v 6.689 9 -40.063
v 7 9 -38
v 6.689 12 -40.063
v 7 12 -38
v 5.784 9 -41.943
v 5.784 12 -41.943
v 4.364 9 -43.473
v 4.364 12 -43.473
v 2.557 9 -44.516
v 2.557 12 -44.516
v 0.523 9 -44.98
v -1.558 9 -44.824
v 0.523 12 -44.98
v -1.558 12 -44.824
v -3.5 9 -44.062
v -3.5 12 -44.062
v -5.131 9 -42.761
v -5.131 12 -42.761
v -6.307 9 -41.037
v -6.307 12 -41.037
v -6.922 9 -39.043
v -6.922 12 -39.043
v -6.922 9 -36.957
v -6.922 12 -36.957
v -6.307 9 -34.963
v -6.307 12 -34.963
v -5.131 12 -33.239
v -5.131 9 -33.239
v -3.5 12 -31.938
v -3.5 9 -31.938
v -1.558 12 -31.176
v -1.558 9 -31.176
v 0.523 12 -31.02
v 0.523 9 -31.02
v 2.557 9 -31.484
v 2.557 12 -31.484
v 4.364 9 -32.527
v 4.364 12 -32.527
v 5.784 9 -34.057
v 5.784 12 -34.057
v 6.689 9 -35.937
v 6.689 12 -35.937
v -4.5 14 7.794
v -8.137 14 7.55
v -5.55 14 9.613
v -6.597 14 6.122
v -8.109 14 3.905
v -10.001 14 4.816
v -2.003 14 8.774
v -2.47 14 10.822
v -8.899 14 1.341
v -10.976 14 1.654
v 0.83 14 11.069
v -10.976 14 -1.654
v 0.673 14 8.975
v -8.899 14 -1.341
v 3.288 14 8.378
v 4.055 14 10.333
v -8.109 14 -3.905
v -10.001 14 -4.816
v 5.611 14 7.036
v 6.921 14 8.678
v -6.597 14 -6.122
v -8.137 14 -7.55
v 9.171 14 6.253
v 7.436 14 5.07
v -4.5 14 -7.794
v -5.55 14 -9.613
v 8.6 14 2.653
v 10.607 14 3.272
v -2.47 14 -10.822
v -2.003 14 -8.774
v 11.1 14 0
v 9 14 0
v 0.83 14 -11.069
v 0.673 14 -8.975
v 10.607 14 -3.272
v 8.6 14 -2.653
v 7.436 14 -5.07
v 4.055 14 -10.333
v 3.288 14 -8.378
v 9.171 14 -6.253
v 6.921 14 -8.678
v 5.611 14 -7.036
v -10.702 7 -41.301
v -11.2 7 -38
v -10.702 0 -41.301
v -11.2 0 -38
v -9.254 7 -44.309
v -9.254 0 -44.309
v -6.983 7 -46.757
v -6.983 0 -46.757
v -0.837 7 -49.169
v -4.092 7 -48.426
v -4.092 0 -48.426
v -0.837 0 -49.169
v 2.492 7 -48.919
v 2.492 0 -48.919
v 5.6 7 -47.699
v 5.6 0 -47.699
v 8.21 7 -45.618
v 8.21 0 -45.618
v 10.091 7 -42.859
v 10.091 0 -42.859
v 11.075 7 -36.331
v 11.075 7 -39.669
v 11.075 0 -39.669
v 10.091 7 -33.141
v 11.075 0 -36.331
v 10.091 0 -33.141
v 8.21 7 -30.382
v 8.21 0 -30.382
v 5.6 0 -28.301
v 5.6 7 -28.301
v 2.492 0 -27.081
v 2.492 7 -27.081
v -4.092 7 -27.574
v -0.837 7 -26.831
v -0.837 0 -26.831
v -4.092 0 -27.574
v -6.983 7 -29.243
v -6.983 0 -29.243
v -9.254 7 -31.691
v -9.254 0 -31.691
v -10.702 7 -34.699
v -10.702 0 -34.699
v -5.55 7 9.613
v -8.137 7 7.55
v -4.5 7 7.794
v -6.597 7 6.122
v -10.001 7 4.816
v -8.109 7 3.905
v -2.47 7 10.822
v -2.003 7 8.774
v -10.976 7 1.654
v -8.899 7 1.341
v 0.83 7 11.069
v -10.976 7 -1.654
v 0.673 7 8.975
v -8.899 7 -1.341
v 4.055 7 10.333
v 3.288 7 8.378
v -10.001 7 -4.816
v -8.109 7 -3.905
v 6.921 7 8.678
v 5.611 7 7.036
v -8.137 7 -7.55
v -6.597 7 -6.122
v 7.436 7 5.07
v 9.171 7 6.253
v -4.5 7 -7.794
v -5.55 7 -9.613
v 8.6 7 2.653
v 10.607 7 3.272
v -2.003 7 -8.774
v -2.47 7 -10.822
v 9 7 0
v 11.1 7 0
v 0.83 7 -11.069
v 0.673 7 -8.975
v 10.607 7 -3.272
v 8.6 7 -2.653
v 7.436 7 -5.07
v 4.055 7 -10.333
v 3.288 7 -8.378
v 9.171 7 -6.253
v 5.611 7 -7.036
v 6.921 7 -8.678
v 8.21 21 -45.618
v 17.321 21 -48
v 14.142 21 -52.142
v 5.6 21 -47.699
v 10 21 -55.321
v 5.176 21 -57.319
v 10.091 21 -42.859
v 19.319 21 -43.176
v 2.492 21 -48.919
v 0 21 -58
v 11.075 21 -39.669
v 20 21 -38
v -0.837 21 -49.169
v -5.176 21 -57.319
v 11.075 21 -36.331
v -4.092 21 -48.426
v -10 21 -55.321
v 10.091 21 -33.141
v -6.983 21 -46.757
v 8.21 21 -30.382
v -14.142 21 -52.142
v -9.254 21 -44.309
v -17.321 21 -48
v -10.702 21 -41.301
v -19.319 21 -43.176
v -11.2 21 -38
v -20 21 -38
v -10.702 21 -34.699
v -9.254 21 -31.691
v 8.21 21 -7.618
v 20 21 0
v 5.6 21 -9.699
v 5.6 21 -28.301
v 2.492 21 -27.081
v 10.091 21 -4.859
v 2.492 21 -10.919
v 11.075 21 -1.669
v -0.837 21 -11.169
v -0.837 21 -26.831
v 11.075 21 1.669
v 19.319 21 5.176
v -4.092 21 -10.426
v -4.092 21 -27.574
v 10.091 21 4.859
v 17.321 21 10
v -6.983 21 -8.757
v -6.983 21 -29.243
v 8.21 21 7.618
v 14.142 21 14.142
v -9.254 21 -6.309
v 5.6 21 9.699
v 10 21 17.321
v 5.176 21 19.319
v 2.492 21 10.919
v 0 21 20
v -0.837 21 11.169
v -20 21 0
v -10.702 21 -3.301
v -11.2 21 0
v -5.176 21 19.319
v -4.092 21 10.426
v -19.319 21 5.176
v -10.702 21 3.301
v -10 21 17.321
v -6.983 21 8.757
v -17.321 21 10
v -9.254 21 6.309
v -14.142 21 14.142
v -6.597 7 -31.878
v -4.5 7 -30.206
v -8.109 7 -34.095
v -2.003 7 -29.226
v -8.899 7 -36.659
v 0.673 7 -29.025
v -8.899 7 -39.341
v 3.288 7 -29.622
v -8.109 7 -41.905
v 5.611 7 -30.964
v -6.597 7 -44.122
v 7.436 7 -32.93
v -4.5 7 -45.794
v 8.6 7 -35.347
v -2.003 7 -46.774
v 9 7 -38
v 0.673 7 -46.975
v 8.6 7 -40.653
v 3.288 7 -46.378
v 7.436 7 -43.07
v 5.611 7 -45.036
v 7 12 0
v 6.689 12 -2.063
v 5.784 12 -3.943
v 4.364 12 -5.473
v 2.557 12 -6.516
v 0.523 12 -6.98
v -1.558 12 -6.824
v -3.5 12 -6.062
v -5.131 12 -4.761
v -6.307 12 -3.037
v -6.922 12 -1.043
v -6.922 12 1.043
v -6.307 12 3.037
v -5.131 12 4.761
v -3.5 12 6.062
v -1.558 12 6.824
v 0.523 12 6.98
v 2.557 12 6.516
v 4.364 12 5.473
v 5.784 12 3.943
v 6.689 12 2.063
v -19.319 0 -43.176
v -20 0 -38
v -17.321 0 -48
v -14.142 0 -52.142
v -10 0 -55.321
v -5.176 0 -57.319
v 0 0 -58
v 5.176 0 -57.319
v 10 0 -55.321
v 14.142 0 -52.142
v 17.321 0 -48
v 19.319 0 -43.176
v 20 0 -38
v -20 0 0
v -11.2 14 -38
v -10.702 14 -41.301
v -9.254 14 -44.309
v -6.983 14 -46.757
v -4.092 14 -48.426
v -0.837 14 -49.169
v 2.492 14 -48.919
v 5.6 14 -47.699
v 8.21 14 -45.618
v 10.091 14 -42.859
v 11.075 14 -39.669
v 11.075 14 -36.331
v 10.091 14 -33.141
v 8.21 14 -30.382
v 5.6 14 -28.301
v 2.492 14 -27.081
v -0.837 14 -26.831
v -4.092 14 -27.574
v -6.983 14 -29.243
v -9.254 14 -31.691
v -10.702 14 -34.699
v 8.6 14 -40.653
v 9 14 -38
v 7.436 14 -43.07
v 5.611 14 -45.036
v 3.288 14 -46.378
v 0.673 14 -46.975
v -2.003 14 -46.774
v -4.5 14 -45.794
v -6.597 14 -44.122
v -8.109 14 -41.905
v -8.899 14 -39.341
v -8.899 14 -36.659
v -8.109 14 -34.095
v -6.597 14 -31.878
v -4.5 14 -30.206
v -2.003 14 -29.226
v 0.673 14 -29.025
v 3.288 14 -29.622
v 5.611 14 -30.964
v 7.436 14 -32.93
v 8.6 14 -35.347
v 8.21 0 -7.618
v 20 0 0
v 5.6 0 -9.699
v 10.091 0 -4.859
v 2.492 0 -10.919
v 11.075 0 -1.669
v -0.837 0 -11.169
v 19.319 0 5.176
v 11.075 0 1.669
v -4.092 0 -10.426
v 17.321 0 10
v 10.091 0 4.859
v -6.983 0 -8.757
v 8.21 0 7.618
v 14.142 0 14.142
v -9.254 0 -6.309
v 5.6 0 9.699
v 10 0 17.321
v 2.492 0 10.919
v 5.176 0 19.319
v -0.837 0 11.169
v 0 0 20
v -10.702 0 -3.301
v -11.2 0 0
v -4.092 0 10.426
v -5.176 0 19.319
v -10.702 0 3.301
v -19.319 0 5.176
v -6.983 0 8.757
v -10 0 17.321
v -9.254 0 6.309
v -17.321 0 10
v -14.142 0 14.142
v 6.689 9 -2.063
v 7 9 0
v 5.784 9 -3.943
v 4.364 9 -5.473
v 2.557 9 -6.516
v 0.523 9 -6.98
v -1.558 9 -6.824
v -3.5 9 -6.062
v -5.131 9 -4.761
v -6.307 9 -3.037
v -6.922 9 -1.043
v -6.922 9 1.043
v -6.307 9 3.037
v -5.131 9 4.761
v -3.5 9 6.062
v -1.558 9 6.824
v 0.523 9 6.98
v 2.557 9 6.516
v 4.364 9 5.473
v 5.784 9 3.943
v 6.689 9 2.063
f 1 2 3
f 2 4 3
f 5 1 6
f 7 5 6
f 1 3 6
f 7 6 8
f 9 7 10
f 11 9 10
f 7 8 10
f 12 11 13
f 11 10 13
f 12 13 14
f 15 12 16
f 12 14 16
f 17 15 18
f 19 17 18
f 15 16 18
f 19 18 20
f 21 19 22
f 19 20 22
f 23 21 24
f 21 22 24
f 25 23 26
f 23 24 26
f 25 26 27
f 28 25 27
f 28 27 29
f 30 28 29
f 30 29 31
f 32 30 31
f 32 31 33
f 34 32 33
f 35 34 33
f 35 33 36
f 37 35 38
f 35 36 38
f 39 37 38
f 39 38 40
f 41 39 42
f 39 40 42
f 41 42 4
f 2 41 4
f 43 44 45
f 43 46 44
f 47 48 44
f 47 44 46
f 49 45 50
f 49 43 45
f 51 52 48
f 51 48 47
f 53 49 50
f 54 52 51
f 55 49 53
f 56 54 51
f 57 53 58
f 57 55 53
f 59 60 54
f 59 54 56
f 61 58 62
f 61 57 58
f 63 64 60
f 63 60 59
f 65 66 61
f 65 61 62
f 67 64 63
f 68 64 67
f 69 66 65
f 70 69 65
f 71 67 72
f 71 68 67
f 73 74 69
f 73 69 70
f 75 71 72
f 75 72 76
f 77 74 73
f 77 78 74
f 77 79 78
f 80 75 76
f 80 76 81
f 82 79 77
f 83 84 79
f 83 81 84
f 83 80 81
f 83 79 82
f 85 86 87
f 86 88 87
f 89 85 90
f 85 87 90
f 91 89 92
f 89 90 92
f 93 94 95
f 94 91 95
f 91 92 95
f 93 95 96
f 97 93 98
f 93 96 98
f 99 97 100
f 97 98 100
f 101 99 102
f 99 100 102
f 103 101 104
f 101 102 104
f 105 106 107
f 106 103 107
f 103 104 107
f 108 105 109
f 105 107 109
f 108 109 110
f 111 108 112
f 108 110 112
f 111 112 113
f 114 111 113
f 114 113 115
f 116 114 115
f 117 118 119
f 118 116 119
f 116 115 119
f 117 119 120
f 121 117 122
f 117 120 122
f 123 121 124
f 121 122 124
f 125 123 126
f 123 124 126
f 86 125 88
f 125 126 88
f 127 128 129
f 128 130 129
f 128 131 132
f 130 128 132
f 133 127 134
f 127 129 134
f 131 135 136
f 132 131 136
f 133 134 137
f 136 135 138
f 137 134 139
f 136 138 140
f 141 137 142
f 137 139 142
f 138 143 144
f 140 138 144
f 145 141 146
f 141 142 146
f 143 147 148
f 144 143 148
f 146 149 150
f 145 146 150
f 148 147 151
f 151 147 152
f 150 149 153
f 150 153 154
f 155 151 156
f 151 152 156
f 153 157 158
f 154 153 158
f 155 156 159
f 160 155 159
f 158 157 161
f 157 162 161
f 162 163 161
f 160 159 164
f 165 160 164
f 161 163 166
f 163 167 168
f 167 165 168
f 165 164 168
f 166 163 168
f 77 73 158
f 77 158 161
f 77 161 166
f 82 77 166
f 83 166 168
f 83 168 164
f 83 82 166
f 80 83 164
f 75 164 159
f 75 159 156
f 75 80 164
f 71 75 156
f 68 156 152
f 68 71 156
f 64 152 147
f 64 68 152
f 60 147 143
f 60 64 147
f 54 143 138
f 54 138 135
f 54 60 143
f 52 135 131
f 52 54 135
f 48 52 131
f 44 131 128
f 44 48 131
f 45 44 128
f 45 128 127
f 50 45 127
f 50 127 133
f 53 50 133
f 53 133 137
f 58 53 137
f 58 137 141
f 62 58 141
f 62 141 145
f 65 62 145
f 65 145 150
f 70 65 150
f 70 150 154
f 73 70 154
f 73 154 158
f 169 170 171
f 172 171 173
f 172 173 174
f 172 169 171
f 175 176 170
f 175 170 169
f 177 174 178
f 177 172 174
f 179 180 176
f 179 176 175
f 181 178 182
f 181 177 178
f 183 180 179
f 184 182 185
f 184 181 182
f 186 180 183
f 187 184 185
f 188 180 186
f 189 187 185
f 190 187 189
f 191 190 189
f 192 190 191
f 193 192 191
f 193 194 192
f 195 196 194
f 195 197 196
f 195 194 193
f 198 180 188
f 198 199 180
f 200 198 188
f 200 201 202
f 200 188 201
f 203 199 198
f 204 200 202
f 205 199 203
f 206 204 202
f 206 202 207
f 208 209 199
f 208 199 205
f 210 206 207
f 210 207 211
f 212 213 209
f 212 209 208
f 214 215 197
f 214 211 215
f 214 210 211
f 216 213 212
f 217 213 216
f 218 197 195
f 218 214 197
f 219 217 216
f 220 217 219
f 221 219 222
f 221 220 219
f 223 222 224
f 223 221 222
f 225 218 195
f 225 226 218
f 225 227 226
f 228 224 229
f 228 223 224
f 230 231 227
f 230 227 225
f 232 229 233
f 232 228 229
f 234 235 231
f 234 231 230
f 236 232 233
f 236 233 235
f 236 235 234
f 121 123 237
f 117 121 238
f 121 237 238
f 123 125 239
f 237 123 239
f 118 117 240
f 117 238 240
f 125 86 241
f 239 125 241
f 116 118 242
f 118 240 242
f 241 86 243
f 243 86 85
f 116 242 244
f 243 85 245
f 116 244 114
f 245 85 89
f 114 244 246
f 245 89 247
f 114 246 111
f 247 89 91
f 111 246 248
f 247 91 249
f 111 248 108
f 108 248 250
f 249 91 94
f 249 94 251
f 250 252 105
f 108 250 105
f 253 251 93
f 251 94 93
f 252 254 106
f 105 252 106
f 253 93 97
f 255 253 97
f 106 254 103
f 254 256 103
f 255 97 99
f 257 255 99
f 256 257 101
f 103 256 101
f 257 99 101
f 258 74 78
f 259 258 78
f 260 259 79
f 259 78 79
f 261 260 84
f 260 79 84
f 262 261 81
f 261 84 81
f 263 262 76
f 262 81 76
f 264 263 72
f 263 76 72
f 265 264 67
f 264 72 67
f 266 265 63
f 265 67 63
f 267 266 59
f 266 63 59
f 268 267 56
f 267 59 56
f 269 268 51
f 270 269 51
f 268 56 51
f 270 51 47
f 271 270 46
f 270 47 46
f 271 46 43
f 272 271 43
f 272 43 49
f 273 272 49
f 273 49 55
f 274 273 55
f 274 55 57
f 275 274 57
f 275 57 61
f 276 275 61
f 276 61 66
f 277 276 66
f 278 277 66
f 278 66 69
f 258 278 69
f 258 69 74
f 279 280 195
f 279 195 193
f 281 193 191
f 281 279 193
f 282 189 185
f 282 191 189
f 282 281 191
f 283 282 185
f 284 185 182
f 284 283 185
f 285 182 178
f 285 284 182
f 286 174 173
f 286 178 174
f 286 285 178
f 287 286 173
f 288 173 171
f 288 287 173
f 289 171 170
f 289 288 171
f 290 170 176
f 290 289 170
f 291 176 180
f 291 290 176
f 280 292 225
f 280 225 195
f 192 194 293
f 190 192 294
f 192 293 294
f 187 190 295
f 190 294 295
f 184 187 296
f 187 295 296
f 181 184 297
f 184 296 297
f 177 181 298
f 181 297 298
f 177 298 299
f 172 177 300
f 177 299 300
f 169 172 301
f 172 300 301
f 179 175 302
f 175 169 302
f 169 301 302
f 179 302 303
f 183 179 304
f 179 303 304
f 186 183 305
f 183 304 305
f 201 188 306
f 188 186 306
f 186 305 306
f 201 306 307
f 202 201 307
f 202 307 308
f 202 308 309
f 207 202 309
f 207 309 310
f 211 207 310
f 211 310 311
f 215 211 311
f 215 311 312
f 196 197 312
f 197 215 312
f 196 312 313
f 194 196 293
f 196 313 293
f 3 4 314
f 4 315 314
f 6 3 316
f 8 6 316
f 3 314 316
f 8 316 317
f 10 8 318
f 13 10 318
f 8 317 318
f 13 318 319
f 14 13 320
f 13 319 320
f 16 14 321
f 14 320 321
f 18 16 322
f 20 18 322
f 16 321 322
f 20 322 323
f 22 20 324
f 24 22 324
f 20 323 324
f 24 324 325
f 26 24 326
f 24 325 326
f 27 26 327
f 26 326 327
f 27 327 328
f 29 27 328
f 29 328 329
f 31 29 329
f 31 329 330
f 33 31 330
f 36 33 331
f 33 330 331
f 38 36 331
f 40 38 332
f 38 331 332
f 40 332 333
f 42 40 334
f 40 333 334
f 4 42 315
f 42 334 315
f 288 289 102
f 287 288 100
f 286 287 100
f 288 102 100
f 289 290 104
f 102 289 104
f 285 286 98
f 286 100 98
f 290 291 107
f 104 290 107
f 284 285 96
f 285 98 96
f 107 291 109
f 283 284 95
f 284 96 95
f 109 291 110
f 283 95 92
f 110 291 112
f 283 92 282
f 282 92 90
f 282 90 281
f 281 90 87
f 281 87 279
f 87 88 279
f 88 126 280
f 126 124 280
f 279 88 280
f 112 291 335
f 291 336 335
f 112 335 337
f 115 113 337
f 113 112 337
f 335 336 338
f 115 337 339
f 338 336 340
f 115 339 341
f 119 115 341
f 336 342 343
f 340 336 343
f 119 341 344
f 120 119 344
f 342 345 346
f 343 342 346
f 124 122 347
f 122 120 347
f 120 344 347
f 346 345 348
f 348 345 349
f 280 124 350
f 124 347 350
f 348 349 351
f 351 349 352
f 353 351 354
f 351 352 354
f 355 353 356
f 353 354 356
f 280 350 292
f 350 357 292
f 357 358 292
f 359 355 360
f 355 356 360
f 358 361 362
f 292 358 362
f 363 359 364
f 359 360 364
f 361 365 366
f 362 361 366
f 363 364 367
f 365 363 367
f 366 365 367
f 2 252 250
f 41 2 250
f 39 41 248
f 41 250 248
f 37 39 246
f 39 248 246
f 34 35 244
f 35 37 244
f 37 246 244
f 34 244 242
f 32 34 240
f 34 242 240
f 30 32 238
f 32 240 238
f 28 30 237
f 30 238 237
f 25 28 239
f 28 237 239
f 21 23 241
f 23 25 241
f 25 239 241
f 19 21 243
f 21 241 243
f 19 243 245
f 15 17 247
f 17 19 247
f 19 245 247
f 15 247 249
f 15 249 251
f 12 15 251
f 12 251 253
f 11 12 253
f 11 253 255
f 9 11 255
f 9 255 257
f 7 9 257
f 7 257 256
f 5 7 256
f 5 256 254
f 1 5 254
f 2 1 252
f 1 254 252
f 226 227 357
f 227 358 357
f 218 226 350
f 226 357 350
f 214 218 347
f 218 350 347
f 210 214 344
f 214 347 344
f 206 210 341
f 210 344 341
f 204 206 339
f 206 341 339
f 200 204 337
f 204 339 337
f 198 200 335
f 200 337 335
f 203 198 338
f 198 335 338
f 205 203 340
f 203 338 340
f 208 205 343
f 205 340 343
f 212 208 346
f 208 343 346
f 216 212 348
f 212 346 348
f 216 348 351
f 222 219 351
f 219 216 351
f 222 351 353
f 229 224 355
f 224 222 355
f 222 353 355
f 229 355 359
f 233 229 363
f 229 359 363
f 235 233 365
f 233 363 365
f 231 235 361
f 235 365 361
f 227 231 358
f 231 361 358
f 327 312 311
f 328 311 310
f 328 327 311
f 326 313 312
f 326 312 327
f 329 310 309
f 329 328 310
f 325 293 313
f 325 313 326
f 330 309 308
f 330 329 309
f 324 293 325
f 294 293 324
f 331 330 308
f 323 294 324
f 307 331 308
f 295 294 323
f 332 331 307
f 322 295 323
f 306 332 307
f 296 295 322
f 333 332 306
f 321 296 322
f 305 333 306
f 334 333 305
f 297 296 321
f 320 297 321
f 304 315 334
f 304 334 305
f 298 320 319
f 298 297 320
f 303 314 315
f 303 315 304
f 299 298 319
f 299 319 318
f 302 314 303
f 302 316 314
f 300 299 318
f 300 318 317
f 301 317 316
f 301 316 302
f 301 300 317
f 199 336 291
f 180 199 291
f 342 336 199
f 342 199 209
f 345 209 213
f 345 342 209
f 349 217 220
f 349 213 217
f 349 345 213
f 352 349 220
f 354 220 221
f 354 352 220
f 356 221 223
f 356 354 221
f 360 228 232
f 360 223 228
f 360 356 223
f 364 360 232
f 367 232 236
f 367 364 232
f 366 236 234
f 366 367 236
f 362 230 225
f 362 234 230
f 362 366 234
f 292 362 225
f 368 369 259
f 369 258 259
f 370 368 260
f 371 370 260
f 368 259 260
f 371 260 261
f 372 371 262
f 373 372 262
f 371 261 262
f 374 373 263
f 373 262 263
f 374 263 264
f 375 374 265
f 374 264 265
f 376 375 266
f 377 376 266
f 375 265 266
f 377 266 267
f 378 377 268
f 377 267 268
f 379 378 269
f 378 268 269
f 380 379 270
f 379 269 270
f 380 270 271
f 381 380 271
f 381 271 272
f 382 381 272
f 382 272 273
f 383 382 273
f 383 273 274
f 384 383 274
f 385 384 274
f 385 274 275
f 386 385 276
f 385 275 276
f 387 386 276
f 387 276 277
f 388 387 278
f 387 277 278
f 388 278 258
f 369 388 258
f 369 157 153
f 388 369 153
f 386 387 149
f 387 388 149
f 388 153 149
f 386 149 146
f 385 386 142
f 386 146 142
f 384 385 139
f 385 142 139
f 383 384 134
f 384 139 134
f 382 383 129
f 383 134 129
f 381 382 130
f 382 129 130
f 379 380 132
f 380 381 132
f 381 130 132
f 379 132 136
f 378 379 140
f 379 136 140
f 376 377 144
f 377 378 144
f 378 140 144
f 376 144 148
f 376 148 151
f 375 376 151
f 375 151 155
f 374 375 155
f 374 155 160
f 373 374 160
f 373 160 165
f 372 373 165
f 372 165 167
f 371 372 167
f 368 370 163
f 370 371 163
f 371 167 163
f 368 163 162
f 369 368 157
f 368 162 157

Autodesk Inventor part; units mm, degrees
ref_plane "YZ Plane" through (0, 0, 0) normal (1, 0, 0) x (0, 1, 0)
ref_plane "XZ Plane" through (0, 0, 0) normal (0, 1, 0) x (-1, 0, 0)
sketch "Sketch1" plane through (0, 0, 0) normal (0, 1, 0) x (-1, 0, 0)
  circle A0 centre (0, 0) radius 11.2
  circle A1 centre (0, -38) radius 11.2
  circle A2 centre (0, 0) radius 20
  circle A3 centre (0, -38) radius 20
  line L0 (20, 0) -> (20, -38)
  line L1 (-20, 0) -> (-20, -38)
  dimension "d0" = 22.4
  dimension "d1" = 22.4
  dimension "d2" = 0
  dimension "d3" = 38
  dimension "d4" = 40
  dimension "d5" = 40
extrude "Extrusion1" add sketch "Sketch1" along normal blind 21
ref_plane "Work Plane1" through (0, 14, 0) normal (0, 1, 0) x (1, 0, 0)
sketch "Sketch2" plane through (0, 14, 0) normal (0, 1, 0) x (1, 0, 0)
  circle A0 centre (0, 0) radius 7
  circle A1 centre (0, 38) radius 11.2 projected
  circle A2 centre (0, 38) radius 7
  circle A3 centre (0, 0) radius 11.1
  dimension "d9" = 14
  dimension "d10" = 14
extrude "Extrusion2" add sketch "Sketch2" against normal blind 7
chamfer "Chamfer1" distance 2 angle 45 4 edges at (-7, 14, 0) (-7, 14, -38) (-7, 7, -38) (-7, 7, 0)
properties part number "Distancia_Cojinetes"
